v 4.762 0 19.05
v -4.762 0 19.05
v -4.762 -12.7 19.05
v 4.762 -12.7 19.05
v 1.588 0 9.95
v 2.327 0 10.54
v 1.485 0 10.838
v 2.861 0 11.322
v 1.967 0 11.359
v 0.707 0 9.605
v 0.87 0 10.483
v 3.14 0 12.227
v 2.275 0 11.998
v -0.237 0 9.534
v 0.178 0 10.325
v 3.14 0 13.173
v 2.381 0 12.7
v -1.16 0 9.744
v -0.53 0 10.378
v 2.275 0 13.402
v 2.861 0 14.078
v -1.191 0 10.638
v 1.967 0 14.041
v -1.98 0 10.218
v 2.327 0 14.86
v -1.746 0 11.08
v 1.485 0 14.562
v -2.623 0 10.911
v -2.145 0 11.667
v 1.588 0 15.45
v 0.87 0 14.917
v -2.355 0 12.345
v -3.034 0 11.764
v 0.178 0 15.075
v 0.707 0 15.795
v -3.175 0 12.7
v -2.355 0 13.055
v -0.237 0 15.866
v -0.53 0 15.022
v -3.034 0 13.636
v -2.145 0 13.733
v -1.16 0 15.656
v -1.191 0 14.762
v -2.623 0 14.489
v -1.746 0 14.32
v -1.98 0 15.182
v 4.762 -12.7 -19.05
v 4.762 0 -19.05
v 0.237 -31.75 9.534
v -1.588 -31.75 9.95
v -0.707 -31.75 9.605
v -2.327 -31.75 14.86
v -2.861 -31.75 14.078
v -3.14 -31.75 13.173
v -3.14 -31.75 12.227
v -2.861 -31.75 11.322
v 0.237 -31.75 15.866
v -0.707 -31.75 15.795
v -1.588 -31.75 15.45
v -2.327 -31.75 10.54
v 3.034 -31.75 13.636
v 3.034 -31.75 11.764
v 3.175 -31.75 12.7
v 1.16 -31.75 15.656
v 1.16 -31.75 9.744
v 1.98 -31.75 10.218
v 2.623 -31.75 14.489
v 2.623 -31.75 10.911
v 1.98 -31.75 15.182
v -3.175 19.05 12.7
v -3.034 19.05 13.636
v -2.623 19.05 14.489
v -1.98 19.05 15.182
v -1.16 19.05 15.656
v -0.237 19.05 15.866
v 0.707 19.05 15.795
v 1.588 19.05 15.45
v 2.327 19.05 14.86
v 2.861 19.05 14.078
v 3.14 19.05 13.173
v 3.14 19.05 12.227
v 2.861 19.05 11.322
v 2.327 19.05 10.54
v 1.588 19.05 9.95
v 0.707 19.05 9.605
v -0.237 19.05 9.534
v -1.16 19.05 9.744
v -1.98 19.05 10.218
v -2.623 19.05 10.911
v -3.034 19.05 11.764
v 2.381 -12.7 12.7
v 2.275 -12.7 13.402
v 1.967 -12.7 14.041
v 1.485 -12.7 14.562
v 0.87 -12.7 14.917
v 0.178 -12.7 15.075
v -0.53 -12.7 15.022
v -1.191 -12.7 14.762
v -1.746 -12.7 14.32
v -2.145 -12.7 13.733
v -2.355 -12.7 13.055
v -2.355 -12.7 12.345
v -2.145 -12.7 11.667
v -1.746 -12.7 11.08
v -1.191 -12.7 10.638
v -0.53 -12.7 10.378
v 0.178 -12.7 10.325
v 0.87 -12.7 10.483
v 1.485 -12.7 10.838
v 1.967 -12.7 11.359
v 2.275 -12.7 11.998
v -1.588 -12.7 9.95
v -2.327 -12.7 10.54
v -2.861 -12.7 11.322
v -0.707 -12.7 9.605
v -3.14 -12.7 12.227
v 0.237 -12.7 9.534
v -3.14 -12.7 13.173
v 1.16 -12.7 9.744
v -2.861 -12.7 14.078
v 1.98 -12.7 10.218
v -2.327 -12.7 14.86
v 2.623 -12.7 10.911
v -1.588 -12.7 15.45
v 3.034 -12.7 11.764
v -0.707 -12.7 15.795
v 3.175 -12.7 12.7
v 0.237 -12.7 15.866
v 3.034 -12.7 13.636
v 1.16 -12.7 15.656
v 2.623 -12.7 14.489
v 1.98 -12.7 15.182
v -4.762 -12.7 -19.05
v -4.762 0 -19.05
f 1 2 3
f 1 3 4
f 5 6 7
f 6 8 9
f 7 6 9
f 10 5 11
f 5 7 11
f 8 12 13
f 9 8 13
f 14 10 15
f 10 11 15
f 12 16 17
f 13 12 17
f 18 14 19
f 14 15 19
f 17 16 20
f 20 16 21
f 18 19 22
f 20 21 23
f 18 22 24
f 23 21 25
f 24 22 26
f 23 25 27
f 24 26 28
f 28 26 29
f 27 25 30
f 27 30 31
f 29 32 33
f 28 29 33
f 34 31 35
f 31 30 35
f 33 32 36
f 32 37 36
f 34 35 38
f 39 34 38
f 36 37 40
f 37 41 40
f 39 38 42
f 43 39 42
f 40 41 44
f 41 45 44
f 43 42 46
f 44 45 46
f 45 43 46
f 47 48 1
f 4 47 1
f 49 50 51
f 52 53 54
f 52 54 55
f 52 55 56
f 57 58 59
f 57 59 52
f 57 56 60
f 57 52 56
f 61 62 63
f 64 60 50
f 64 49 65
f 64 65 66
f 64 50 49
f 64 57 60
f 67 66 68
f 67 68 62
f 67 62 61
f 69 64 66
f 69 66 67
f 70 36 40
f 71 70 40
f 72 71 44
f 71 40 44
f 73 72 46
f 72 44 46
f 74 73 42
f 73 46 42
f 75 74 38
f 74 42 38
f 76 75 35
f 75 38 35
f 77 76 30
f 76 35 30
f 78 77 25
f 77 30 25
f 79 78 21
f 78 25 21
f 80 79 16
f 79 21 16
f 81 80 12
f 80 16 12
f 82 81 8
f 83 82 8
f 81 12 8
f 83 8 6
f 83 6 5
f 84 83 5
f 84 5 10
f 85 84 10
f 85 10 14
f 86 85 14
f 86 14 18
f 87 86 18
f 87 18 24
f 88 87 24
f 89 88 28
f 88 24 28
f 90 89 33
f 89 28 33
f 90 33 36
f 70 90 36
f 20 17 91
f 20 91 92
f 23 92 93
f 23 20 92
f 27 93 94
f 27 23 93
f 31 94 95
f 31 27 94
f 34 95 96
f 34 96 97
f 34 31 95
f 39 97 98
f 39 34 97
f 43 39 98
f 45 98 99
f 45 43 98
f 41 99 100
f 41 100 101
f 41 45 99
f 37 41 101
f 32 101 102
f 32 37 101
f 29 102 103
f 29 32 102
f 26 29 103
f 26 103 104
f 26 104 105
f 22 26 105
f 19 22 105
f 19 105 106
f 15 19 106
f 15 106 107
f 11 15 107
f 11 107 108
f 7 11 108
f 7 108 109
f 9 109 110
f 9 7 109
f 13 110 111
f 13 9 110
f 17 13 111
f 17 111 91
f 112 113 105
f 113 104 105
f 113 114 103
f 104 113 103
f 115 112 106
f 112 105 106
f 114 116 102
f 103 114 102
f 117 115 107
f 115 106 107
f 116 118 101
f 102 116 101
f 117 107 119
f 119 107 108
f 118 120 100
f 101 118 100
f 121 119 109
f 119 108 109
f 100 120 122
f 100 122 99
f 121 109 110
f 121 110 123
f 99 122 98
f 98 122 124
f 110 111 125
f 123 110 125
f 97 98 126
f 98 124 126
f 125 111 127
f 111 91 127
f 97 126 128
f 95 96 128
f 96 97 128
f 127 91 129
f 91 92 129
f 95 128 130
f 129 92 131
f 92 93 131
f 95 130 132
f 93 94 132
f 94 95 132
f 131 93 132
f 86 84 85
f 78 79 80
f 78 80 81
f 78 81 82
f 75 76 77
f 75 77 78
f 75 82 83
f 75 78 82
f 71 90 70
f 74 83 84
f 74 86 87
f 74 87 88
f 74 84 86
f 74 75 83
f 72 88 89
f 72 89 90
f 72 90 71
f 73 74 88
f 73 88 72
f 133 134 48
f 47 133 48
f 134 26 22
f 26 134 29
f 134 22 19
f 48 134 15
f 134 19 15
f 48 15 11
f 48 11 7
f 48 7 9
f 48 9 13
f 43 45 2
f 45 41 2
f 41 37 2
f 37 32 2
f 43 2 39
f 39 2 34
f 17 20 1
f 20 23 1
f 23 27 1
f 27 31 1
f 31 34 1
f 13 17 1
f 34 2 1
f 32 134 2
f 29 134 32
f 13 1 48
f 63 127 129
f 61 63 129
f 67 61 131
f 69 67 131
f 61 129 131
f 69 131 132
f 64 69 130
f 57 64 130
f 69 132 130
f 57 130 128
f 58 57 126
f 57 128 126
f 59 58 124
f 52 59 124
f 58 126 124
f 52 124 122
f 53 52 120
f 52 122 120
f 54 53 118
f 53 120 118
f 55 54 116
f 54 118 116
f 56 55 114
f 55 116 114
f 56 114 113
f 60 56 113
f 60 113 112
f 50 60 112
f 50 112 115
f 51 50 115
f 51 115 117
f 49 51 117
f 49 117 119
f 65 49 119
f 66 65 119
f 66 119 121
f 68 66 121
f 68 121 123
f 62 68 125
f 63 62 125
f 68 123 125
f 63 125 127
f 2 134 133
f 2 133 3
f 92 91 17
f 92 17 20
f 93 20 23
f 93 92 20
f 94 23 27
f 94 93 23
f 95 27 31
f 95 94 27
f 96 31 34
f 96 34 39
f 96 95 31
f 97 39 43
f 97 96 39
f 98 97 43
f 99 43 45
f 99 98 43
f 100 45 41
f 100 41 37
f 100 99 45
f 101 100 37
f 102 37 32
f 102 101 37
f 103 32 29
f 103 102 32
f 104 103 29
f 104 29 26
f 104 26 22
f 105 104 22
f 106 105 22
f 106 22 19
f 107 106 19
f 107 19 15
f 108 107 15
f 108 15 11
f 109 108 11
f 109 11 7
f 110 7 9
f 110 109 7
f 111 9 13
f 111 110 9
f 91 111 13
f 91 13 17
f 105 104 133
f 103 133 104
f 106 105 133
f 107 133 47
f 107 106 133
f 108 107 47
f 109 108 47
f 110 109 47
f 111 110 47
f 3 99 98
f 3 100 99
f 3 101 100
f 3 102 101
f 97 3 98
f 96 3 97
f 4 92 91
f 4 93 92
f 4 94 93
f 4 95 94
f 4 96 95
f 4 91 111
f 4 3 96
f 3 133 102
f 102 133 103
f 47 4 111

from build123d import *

# Parameters (mm, degrees)
F0_W     = 9.525
F0_H     = 38.1
F0_R     = 2.38125
F1_DEPTH = 12.7
F2_R     = 2.38125
F3_DEPTH = 12.7
F2_R_2   = 3.175
F4_DEPTH = 19.05
F5_R     = 3.175
F5_R_2   = 2.38125
F6_DEPTH = 19.05


with BuildPart() as f1:
    # F0 (on Front) → F1 (new body)
    with BuildSketch(Plane.XZ):
        Rectangle(F0_W, F0_H)
        with Locations((0, 12.7)):
            Circle(F0_R, mode=Mode.SUBTRACT)
    extrude(amount=F1_DEPTH)


with BuildPart() as f3:
    # F2 (on face) → F3 (new body)
    with BuildSketch(Plane.XZ.offset(12.7)):
        with Locations((0, 12.7)):
            Circle(F2_R)
    extrude(amount=-F3_DEPTH)

    # F2 (on face) → F4 (join)
    with BuildSketch(Plane.XZ.offset(12.7)):
        with Locations((0, 12.7)):
            Circle(F2_R_2)
        with Locations((0, 12.7)):
            Circle(F2_R, mode=Mode.SUBTRACT)
        with Locations((0, 12.7)):
            Circle(F2_R)
    extrude(amount=F4_DEPTH)

    # F5 (on face) → F6 (join)
    with BuildSketch(Plane(origin=(0, 0, 0), x_dir=(-1, 0, 0), z_dir=(0, 1, 0))):
        with Locations((0, 12.7)):
            Circle(F5_R)
        with Locations((0, 12.7)):
            Circle(F5_R_2, mode=Mode.SUBTRACT)
        with Locations((0, 12.7)):
            Circle(F5_R_2)
    extrude(amount=F6_DEPTH)


solid = Compound([f1.part, f3.part])
